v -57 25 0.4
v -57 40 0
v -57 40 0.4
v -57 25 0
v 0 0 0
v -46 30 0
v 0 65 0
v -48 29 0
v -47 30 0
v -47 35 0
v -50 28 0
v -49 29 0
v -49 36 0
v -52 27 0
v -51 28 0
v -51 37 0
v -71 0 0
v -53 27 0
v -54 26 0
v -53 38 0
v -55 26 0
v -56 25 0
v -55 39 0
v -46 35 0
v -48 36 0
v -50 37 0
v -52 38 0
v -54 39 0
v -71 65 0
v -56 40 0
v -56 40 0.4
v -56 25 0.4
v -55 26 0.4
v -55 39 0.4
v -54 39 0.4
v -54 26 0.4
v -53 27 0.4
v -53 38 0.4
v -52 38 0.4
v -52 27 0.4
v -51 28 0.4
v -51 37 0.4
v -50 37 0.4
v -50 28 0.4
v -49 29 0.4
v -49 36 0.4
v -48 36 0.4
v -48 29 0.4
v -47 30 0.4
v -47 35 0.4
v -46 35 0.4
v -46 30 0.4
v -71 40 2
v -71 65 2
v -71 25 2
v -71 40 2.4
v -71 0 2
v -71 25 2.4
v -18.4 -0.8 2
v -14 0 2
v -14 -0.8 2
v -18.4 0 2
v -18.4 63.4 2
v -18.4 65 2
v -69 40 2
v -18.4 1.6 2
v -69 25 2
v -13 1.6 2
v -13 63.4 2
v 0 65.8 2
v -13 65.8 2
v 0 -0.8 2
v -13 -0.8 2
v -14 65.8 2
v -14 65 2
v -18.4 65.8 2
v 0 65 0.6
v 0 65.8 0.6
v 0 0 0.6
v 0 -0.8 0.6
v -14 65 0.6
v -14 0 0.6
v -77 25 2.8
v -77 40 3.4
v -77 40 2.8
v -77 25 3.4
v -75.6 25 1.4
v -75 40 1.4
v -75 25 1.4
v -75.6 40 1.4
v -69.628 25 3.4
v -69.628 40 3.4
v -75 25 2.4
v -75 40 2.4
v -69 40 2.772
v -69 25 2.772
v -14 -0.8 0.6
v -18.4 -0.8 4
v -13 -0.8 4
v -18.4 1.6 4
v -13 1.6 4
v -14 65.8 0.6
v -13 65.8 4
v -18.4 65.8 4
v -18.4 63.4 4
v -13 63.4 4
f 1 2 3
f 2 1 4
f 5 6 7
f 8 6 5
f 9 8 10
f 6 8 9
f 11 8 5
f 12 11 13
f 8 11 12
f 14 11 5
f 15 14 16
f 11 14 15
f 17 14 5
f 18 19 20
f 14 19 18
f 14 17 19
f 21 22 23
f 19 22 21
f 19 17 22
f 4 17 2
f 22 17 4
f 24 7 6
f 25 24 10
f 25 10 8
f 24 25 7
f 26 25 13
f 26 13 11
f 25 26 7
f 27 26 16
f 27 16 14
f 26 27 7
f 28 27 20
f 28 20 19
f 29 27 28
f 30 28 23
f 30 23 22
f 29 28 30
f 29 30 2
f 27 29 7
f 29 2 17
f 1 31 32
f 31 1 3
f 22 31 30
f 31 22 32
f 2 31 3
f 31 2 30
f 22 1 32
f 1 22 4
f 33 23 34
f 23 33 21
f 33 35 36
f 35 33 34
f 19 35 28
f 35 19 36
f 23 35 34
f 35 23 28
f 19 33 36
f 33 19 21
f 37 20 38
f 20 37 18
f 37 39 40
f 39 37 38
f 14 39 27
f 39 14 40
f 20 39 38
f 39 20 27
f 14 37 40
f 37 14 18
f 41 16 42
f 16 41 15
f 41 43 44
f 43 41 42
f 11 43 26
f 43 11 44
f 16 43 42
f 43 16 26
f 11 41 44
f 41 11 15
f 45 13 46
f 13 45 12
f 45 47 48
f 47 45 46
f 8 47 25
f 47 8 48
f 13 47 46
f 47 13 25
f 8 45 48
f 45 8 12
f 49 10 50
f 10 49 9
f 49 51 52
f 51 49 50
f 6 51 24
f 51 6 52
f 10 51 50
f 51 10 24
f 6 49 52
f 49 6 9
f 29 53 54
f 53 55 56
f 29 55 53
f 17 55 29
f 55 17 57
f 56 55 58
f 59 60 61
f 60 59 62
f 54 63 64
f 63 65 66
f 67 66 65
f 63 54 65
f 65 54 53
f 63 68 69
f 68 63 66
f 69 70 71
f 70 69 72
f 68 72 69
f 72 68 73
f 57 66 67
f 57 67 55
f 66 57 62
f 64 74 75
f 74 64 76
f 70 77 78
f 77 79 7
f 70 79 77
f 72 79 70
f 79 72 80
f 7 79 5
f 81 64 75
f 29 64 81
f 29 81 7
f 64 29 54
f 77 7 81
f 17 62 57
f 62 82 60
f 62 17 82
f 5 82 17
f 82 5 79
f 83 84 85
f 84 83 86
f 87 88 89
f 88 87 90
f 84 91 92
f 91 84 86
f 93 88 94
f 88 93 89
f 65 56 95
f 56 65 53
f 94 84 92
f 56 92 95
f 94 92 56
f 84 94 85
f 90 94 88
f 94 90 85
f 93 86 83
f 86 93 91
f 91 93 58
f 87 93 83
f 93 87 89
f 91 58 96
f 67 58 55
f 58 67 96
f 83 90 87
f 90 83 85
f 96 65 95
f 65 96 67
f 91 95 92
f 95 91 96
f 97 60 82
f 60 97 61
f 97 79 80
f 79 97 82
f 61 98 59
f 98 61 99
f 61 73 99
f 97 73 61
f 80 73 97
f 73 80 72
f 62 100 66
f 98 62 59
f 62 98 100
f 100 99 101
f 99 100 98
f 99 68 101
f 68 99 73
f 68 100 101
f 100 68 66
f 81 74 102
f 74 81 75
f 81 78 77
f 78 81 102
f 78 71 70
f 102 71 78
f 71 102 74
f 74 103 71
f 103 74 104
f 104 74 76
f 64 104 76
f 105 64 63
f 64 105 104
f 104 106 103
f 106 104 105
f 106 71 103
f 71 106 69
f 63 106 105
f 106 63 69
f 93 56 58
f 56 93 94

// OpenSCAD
/* [Global] */

Personalize = "no"; // [yes,no]
Name = "Somebody";	
Address = "Somewhere";

/* [Hidden] */

h = 65;
w = 71;
t = 2;

module cover() {
	difference() {
		cube([w,h,t]);
	
		for (i=[5:2:15]) {	
			translate([w-i-10, h/2-(20-i)/2, 2-.4])
				cube([1,20-i,.4]);
		}
		
		if (Personalize == "yes") {
			translate([w-40, h-32, 2-.4])
				rotate([0,0,-90])
				linear_extrude(height = .4)
					text( "Property of", 
						font = "Arial:style=Bold",
								size=4, 
								$fn=20, 
								valign="center", 
								halign = "center"
							);
			
			translate([w-50, h-32, 2-.4])
				rotate([0,0,-90])
				linear_extrude(height = .4)
					text( Name, 
						font = "Arial:style=Bold",
								size=4, 
								$fn=20, 
								valign="center", 
								halign = "center"
							);
			translate([w-60, h-32, 2-.4])
				rotate([0,0,-90])
				linear_extrude(height = .4)
					text( Address, 
						font = "Arial:style=Bold",
								size=4, 
								$fn=20, 
								valign="center", 
								halign = "center"
							);
		}	
	}
	translate([0,-.8,0])
		cube([14,.8,1.4]);
	
	translate([13,-.8,-2])
		cube([5.4,2.4,2]);
		
	translate([0,h,0])
		cube([14,.8,1.4]);
	
	translate([13,h-1.6,-2])
		cube([5.4,2.4,2]);
		
	translate([w-1,h/2-15/2,-1.4])
		cube([6,15,1]);
	
	difference() {
		translate([w+4,h/2-15/2,-1.4])
			cube([2,15,2]);
		
		translate([w+4+.2,h/2-15/2-.5,1])
		rotate([0,45,0])
			cube([4,16,2]);
	}
	
	
	difference() {
		translate([w-2,h/2-15/2,-1.4])
			cube([2,15,2]);
	
		translate([w-3.8,h/2-15/2-.5,-1.8])
			rotate([0,45,0])
				cube([2.8,16,2]);
	}
}

rotate([0,180,0]) 
	translate([0,0,-2]) 
		cover();
